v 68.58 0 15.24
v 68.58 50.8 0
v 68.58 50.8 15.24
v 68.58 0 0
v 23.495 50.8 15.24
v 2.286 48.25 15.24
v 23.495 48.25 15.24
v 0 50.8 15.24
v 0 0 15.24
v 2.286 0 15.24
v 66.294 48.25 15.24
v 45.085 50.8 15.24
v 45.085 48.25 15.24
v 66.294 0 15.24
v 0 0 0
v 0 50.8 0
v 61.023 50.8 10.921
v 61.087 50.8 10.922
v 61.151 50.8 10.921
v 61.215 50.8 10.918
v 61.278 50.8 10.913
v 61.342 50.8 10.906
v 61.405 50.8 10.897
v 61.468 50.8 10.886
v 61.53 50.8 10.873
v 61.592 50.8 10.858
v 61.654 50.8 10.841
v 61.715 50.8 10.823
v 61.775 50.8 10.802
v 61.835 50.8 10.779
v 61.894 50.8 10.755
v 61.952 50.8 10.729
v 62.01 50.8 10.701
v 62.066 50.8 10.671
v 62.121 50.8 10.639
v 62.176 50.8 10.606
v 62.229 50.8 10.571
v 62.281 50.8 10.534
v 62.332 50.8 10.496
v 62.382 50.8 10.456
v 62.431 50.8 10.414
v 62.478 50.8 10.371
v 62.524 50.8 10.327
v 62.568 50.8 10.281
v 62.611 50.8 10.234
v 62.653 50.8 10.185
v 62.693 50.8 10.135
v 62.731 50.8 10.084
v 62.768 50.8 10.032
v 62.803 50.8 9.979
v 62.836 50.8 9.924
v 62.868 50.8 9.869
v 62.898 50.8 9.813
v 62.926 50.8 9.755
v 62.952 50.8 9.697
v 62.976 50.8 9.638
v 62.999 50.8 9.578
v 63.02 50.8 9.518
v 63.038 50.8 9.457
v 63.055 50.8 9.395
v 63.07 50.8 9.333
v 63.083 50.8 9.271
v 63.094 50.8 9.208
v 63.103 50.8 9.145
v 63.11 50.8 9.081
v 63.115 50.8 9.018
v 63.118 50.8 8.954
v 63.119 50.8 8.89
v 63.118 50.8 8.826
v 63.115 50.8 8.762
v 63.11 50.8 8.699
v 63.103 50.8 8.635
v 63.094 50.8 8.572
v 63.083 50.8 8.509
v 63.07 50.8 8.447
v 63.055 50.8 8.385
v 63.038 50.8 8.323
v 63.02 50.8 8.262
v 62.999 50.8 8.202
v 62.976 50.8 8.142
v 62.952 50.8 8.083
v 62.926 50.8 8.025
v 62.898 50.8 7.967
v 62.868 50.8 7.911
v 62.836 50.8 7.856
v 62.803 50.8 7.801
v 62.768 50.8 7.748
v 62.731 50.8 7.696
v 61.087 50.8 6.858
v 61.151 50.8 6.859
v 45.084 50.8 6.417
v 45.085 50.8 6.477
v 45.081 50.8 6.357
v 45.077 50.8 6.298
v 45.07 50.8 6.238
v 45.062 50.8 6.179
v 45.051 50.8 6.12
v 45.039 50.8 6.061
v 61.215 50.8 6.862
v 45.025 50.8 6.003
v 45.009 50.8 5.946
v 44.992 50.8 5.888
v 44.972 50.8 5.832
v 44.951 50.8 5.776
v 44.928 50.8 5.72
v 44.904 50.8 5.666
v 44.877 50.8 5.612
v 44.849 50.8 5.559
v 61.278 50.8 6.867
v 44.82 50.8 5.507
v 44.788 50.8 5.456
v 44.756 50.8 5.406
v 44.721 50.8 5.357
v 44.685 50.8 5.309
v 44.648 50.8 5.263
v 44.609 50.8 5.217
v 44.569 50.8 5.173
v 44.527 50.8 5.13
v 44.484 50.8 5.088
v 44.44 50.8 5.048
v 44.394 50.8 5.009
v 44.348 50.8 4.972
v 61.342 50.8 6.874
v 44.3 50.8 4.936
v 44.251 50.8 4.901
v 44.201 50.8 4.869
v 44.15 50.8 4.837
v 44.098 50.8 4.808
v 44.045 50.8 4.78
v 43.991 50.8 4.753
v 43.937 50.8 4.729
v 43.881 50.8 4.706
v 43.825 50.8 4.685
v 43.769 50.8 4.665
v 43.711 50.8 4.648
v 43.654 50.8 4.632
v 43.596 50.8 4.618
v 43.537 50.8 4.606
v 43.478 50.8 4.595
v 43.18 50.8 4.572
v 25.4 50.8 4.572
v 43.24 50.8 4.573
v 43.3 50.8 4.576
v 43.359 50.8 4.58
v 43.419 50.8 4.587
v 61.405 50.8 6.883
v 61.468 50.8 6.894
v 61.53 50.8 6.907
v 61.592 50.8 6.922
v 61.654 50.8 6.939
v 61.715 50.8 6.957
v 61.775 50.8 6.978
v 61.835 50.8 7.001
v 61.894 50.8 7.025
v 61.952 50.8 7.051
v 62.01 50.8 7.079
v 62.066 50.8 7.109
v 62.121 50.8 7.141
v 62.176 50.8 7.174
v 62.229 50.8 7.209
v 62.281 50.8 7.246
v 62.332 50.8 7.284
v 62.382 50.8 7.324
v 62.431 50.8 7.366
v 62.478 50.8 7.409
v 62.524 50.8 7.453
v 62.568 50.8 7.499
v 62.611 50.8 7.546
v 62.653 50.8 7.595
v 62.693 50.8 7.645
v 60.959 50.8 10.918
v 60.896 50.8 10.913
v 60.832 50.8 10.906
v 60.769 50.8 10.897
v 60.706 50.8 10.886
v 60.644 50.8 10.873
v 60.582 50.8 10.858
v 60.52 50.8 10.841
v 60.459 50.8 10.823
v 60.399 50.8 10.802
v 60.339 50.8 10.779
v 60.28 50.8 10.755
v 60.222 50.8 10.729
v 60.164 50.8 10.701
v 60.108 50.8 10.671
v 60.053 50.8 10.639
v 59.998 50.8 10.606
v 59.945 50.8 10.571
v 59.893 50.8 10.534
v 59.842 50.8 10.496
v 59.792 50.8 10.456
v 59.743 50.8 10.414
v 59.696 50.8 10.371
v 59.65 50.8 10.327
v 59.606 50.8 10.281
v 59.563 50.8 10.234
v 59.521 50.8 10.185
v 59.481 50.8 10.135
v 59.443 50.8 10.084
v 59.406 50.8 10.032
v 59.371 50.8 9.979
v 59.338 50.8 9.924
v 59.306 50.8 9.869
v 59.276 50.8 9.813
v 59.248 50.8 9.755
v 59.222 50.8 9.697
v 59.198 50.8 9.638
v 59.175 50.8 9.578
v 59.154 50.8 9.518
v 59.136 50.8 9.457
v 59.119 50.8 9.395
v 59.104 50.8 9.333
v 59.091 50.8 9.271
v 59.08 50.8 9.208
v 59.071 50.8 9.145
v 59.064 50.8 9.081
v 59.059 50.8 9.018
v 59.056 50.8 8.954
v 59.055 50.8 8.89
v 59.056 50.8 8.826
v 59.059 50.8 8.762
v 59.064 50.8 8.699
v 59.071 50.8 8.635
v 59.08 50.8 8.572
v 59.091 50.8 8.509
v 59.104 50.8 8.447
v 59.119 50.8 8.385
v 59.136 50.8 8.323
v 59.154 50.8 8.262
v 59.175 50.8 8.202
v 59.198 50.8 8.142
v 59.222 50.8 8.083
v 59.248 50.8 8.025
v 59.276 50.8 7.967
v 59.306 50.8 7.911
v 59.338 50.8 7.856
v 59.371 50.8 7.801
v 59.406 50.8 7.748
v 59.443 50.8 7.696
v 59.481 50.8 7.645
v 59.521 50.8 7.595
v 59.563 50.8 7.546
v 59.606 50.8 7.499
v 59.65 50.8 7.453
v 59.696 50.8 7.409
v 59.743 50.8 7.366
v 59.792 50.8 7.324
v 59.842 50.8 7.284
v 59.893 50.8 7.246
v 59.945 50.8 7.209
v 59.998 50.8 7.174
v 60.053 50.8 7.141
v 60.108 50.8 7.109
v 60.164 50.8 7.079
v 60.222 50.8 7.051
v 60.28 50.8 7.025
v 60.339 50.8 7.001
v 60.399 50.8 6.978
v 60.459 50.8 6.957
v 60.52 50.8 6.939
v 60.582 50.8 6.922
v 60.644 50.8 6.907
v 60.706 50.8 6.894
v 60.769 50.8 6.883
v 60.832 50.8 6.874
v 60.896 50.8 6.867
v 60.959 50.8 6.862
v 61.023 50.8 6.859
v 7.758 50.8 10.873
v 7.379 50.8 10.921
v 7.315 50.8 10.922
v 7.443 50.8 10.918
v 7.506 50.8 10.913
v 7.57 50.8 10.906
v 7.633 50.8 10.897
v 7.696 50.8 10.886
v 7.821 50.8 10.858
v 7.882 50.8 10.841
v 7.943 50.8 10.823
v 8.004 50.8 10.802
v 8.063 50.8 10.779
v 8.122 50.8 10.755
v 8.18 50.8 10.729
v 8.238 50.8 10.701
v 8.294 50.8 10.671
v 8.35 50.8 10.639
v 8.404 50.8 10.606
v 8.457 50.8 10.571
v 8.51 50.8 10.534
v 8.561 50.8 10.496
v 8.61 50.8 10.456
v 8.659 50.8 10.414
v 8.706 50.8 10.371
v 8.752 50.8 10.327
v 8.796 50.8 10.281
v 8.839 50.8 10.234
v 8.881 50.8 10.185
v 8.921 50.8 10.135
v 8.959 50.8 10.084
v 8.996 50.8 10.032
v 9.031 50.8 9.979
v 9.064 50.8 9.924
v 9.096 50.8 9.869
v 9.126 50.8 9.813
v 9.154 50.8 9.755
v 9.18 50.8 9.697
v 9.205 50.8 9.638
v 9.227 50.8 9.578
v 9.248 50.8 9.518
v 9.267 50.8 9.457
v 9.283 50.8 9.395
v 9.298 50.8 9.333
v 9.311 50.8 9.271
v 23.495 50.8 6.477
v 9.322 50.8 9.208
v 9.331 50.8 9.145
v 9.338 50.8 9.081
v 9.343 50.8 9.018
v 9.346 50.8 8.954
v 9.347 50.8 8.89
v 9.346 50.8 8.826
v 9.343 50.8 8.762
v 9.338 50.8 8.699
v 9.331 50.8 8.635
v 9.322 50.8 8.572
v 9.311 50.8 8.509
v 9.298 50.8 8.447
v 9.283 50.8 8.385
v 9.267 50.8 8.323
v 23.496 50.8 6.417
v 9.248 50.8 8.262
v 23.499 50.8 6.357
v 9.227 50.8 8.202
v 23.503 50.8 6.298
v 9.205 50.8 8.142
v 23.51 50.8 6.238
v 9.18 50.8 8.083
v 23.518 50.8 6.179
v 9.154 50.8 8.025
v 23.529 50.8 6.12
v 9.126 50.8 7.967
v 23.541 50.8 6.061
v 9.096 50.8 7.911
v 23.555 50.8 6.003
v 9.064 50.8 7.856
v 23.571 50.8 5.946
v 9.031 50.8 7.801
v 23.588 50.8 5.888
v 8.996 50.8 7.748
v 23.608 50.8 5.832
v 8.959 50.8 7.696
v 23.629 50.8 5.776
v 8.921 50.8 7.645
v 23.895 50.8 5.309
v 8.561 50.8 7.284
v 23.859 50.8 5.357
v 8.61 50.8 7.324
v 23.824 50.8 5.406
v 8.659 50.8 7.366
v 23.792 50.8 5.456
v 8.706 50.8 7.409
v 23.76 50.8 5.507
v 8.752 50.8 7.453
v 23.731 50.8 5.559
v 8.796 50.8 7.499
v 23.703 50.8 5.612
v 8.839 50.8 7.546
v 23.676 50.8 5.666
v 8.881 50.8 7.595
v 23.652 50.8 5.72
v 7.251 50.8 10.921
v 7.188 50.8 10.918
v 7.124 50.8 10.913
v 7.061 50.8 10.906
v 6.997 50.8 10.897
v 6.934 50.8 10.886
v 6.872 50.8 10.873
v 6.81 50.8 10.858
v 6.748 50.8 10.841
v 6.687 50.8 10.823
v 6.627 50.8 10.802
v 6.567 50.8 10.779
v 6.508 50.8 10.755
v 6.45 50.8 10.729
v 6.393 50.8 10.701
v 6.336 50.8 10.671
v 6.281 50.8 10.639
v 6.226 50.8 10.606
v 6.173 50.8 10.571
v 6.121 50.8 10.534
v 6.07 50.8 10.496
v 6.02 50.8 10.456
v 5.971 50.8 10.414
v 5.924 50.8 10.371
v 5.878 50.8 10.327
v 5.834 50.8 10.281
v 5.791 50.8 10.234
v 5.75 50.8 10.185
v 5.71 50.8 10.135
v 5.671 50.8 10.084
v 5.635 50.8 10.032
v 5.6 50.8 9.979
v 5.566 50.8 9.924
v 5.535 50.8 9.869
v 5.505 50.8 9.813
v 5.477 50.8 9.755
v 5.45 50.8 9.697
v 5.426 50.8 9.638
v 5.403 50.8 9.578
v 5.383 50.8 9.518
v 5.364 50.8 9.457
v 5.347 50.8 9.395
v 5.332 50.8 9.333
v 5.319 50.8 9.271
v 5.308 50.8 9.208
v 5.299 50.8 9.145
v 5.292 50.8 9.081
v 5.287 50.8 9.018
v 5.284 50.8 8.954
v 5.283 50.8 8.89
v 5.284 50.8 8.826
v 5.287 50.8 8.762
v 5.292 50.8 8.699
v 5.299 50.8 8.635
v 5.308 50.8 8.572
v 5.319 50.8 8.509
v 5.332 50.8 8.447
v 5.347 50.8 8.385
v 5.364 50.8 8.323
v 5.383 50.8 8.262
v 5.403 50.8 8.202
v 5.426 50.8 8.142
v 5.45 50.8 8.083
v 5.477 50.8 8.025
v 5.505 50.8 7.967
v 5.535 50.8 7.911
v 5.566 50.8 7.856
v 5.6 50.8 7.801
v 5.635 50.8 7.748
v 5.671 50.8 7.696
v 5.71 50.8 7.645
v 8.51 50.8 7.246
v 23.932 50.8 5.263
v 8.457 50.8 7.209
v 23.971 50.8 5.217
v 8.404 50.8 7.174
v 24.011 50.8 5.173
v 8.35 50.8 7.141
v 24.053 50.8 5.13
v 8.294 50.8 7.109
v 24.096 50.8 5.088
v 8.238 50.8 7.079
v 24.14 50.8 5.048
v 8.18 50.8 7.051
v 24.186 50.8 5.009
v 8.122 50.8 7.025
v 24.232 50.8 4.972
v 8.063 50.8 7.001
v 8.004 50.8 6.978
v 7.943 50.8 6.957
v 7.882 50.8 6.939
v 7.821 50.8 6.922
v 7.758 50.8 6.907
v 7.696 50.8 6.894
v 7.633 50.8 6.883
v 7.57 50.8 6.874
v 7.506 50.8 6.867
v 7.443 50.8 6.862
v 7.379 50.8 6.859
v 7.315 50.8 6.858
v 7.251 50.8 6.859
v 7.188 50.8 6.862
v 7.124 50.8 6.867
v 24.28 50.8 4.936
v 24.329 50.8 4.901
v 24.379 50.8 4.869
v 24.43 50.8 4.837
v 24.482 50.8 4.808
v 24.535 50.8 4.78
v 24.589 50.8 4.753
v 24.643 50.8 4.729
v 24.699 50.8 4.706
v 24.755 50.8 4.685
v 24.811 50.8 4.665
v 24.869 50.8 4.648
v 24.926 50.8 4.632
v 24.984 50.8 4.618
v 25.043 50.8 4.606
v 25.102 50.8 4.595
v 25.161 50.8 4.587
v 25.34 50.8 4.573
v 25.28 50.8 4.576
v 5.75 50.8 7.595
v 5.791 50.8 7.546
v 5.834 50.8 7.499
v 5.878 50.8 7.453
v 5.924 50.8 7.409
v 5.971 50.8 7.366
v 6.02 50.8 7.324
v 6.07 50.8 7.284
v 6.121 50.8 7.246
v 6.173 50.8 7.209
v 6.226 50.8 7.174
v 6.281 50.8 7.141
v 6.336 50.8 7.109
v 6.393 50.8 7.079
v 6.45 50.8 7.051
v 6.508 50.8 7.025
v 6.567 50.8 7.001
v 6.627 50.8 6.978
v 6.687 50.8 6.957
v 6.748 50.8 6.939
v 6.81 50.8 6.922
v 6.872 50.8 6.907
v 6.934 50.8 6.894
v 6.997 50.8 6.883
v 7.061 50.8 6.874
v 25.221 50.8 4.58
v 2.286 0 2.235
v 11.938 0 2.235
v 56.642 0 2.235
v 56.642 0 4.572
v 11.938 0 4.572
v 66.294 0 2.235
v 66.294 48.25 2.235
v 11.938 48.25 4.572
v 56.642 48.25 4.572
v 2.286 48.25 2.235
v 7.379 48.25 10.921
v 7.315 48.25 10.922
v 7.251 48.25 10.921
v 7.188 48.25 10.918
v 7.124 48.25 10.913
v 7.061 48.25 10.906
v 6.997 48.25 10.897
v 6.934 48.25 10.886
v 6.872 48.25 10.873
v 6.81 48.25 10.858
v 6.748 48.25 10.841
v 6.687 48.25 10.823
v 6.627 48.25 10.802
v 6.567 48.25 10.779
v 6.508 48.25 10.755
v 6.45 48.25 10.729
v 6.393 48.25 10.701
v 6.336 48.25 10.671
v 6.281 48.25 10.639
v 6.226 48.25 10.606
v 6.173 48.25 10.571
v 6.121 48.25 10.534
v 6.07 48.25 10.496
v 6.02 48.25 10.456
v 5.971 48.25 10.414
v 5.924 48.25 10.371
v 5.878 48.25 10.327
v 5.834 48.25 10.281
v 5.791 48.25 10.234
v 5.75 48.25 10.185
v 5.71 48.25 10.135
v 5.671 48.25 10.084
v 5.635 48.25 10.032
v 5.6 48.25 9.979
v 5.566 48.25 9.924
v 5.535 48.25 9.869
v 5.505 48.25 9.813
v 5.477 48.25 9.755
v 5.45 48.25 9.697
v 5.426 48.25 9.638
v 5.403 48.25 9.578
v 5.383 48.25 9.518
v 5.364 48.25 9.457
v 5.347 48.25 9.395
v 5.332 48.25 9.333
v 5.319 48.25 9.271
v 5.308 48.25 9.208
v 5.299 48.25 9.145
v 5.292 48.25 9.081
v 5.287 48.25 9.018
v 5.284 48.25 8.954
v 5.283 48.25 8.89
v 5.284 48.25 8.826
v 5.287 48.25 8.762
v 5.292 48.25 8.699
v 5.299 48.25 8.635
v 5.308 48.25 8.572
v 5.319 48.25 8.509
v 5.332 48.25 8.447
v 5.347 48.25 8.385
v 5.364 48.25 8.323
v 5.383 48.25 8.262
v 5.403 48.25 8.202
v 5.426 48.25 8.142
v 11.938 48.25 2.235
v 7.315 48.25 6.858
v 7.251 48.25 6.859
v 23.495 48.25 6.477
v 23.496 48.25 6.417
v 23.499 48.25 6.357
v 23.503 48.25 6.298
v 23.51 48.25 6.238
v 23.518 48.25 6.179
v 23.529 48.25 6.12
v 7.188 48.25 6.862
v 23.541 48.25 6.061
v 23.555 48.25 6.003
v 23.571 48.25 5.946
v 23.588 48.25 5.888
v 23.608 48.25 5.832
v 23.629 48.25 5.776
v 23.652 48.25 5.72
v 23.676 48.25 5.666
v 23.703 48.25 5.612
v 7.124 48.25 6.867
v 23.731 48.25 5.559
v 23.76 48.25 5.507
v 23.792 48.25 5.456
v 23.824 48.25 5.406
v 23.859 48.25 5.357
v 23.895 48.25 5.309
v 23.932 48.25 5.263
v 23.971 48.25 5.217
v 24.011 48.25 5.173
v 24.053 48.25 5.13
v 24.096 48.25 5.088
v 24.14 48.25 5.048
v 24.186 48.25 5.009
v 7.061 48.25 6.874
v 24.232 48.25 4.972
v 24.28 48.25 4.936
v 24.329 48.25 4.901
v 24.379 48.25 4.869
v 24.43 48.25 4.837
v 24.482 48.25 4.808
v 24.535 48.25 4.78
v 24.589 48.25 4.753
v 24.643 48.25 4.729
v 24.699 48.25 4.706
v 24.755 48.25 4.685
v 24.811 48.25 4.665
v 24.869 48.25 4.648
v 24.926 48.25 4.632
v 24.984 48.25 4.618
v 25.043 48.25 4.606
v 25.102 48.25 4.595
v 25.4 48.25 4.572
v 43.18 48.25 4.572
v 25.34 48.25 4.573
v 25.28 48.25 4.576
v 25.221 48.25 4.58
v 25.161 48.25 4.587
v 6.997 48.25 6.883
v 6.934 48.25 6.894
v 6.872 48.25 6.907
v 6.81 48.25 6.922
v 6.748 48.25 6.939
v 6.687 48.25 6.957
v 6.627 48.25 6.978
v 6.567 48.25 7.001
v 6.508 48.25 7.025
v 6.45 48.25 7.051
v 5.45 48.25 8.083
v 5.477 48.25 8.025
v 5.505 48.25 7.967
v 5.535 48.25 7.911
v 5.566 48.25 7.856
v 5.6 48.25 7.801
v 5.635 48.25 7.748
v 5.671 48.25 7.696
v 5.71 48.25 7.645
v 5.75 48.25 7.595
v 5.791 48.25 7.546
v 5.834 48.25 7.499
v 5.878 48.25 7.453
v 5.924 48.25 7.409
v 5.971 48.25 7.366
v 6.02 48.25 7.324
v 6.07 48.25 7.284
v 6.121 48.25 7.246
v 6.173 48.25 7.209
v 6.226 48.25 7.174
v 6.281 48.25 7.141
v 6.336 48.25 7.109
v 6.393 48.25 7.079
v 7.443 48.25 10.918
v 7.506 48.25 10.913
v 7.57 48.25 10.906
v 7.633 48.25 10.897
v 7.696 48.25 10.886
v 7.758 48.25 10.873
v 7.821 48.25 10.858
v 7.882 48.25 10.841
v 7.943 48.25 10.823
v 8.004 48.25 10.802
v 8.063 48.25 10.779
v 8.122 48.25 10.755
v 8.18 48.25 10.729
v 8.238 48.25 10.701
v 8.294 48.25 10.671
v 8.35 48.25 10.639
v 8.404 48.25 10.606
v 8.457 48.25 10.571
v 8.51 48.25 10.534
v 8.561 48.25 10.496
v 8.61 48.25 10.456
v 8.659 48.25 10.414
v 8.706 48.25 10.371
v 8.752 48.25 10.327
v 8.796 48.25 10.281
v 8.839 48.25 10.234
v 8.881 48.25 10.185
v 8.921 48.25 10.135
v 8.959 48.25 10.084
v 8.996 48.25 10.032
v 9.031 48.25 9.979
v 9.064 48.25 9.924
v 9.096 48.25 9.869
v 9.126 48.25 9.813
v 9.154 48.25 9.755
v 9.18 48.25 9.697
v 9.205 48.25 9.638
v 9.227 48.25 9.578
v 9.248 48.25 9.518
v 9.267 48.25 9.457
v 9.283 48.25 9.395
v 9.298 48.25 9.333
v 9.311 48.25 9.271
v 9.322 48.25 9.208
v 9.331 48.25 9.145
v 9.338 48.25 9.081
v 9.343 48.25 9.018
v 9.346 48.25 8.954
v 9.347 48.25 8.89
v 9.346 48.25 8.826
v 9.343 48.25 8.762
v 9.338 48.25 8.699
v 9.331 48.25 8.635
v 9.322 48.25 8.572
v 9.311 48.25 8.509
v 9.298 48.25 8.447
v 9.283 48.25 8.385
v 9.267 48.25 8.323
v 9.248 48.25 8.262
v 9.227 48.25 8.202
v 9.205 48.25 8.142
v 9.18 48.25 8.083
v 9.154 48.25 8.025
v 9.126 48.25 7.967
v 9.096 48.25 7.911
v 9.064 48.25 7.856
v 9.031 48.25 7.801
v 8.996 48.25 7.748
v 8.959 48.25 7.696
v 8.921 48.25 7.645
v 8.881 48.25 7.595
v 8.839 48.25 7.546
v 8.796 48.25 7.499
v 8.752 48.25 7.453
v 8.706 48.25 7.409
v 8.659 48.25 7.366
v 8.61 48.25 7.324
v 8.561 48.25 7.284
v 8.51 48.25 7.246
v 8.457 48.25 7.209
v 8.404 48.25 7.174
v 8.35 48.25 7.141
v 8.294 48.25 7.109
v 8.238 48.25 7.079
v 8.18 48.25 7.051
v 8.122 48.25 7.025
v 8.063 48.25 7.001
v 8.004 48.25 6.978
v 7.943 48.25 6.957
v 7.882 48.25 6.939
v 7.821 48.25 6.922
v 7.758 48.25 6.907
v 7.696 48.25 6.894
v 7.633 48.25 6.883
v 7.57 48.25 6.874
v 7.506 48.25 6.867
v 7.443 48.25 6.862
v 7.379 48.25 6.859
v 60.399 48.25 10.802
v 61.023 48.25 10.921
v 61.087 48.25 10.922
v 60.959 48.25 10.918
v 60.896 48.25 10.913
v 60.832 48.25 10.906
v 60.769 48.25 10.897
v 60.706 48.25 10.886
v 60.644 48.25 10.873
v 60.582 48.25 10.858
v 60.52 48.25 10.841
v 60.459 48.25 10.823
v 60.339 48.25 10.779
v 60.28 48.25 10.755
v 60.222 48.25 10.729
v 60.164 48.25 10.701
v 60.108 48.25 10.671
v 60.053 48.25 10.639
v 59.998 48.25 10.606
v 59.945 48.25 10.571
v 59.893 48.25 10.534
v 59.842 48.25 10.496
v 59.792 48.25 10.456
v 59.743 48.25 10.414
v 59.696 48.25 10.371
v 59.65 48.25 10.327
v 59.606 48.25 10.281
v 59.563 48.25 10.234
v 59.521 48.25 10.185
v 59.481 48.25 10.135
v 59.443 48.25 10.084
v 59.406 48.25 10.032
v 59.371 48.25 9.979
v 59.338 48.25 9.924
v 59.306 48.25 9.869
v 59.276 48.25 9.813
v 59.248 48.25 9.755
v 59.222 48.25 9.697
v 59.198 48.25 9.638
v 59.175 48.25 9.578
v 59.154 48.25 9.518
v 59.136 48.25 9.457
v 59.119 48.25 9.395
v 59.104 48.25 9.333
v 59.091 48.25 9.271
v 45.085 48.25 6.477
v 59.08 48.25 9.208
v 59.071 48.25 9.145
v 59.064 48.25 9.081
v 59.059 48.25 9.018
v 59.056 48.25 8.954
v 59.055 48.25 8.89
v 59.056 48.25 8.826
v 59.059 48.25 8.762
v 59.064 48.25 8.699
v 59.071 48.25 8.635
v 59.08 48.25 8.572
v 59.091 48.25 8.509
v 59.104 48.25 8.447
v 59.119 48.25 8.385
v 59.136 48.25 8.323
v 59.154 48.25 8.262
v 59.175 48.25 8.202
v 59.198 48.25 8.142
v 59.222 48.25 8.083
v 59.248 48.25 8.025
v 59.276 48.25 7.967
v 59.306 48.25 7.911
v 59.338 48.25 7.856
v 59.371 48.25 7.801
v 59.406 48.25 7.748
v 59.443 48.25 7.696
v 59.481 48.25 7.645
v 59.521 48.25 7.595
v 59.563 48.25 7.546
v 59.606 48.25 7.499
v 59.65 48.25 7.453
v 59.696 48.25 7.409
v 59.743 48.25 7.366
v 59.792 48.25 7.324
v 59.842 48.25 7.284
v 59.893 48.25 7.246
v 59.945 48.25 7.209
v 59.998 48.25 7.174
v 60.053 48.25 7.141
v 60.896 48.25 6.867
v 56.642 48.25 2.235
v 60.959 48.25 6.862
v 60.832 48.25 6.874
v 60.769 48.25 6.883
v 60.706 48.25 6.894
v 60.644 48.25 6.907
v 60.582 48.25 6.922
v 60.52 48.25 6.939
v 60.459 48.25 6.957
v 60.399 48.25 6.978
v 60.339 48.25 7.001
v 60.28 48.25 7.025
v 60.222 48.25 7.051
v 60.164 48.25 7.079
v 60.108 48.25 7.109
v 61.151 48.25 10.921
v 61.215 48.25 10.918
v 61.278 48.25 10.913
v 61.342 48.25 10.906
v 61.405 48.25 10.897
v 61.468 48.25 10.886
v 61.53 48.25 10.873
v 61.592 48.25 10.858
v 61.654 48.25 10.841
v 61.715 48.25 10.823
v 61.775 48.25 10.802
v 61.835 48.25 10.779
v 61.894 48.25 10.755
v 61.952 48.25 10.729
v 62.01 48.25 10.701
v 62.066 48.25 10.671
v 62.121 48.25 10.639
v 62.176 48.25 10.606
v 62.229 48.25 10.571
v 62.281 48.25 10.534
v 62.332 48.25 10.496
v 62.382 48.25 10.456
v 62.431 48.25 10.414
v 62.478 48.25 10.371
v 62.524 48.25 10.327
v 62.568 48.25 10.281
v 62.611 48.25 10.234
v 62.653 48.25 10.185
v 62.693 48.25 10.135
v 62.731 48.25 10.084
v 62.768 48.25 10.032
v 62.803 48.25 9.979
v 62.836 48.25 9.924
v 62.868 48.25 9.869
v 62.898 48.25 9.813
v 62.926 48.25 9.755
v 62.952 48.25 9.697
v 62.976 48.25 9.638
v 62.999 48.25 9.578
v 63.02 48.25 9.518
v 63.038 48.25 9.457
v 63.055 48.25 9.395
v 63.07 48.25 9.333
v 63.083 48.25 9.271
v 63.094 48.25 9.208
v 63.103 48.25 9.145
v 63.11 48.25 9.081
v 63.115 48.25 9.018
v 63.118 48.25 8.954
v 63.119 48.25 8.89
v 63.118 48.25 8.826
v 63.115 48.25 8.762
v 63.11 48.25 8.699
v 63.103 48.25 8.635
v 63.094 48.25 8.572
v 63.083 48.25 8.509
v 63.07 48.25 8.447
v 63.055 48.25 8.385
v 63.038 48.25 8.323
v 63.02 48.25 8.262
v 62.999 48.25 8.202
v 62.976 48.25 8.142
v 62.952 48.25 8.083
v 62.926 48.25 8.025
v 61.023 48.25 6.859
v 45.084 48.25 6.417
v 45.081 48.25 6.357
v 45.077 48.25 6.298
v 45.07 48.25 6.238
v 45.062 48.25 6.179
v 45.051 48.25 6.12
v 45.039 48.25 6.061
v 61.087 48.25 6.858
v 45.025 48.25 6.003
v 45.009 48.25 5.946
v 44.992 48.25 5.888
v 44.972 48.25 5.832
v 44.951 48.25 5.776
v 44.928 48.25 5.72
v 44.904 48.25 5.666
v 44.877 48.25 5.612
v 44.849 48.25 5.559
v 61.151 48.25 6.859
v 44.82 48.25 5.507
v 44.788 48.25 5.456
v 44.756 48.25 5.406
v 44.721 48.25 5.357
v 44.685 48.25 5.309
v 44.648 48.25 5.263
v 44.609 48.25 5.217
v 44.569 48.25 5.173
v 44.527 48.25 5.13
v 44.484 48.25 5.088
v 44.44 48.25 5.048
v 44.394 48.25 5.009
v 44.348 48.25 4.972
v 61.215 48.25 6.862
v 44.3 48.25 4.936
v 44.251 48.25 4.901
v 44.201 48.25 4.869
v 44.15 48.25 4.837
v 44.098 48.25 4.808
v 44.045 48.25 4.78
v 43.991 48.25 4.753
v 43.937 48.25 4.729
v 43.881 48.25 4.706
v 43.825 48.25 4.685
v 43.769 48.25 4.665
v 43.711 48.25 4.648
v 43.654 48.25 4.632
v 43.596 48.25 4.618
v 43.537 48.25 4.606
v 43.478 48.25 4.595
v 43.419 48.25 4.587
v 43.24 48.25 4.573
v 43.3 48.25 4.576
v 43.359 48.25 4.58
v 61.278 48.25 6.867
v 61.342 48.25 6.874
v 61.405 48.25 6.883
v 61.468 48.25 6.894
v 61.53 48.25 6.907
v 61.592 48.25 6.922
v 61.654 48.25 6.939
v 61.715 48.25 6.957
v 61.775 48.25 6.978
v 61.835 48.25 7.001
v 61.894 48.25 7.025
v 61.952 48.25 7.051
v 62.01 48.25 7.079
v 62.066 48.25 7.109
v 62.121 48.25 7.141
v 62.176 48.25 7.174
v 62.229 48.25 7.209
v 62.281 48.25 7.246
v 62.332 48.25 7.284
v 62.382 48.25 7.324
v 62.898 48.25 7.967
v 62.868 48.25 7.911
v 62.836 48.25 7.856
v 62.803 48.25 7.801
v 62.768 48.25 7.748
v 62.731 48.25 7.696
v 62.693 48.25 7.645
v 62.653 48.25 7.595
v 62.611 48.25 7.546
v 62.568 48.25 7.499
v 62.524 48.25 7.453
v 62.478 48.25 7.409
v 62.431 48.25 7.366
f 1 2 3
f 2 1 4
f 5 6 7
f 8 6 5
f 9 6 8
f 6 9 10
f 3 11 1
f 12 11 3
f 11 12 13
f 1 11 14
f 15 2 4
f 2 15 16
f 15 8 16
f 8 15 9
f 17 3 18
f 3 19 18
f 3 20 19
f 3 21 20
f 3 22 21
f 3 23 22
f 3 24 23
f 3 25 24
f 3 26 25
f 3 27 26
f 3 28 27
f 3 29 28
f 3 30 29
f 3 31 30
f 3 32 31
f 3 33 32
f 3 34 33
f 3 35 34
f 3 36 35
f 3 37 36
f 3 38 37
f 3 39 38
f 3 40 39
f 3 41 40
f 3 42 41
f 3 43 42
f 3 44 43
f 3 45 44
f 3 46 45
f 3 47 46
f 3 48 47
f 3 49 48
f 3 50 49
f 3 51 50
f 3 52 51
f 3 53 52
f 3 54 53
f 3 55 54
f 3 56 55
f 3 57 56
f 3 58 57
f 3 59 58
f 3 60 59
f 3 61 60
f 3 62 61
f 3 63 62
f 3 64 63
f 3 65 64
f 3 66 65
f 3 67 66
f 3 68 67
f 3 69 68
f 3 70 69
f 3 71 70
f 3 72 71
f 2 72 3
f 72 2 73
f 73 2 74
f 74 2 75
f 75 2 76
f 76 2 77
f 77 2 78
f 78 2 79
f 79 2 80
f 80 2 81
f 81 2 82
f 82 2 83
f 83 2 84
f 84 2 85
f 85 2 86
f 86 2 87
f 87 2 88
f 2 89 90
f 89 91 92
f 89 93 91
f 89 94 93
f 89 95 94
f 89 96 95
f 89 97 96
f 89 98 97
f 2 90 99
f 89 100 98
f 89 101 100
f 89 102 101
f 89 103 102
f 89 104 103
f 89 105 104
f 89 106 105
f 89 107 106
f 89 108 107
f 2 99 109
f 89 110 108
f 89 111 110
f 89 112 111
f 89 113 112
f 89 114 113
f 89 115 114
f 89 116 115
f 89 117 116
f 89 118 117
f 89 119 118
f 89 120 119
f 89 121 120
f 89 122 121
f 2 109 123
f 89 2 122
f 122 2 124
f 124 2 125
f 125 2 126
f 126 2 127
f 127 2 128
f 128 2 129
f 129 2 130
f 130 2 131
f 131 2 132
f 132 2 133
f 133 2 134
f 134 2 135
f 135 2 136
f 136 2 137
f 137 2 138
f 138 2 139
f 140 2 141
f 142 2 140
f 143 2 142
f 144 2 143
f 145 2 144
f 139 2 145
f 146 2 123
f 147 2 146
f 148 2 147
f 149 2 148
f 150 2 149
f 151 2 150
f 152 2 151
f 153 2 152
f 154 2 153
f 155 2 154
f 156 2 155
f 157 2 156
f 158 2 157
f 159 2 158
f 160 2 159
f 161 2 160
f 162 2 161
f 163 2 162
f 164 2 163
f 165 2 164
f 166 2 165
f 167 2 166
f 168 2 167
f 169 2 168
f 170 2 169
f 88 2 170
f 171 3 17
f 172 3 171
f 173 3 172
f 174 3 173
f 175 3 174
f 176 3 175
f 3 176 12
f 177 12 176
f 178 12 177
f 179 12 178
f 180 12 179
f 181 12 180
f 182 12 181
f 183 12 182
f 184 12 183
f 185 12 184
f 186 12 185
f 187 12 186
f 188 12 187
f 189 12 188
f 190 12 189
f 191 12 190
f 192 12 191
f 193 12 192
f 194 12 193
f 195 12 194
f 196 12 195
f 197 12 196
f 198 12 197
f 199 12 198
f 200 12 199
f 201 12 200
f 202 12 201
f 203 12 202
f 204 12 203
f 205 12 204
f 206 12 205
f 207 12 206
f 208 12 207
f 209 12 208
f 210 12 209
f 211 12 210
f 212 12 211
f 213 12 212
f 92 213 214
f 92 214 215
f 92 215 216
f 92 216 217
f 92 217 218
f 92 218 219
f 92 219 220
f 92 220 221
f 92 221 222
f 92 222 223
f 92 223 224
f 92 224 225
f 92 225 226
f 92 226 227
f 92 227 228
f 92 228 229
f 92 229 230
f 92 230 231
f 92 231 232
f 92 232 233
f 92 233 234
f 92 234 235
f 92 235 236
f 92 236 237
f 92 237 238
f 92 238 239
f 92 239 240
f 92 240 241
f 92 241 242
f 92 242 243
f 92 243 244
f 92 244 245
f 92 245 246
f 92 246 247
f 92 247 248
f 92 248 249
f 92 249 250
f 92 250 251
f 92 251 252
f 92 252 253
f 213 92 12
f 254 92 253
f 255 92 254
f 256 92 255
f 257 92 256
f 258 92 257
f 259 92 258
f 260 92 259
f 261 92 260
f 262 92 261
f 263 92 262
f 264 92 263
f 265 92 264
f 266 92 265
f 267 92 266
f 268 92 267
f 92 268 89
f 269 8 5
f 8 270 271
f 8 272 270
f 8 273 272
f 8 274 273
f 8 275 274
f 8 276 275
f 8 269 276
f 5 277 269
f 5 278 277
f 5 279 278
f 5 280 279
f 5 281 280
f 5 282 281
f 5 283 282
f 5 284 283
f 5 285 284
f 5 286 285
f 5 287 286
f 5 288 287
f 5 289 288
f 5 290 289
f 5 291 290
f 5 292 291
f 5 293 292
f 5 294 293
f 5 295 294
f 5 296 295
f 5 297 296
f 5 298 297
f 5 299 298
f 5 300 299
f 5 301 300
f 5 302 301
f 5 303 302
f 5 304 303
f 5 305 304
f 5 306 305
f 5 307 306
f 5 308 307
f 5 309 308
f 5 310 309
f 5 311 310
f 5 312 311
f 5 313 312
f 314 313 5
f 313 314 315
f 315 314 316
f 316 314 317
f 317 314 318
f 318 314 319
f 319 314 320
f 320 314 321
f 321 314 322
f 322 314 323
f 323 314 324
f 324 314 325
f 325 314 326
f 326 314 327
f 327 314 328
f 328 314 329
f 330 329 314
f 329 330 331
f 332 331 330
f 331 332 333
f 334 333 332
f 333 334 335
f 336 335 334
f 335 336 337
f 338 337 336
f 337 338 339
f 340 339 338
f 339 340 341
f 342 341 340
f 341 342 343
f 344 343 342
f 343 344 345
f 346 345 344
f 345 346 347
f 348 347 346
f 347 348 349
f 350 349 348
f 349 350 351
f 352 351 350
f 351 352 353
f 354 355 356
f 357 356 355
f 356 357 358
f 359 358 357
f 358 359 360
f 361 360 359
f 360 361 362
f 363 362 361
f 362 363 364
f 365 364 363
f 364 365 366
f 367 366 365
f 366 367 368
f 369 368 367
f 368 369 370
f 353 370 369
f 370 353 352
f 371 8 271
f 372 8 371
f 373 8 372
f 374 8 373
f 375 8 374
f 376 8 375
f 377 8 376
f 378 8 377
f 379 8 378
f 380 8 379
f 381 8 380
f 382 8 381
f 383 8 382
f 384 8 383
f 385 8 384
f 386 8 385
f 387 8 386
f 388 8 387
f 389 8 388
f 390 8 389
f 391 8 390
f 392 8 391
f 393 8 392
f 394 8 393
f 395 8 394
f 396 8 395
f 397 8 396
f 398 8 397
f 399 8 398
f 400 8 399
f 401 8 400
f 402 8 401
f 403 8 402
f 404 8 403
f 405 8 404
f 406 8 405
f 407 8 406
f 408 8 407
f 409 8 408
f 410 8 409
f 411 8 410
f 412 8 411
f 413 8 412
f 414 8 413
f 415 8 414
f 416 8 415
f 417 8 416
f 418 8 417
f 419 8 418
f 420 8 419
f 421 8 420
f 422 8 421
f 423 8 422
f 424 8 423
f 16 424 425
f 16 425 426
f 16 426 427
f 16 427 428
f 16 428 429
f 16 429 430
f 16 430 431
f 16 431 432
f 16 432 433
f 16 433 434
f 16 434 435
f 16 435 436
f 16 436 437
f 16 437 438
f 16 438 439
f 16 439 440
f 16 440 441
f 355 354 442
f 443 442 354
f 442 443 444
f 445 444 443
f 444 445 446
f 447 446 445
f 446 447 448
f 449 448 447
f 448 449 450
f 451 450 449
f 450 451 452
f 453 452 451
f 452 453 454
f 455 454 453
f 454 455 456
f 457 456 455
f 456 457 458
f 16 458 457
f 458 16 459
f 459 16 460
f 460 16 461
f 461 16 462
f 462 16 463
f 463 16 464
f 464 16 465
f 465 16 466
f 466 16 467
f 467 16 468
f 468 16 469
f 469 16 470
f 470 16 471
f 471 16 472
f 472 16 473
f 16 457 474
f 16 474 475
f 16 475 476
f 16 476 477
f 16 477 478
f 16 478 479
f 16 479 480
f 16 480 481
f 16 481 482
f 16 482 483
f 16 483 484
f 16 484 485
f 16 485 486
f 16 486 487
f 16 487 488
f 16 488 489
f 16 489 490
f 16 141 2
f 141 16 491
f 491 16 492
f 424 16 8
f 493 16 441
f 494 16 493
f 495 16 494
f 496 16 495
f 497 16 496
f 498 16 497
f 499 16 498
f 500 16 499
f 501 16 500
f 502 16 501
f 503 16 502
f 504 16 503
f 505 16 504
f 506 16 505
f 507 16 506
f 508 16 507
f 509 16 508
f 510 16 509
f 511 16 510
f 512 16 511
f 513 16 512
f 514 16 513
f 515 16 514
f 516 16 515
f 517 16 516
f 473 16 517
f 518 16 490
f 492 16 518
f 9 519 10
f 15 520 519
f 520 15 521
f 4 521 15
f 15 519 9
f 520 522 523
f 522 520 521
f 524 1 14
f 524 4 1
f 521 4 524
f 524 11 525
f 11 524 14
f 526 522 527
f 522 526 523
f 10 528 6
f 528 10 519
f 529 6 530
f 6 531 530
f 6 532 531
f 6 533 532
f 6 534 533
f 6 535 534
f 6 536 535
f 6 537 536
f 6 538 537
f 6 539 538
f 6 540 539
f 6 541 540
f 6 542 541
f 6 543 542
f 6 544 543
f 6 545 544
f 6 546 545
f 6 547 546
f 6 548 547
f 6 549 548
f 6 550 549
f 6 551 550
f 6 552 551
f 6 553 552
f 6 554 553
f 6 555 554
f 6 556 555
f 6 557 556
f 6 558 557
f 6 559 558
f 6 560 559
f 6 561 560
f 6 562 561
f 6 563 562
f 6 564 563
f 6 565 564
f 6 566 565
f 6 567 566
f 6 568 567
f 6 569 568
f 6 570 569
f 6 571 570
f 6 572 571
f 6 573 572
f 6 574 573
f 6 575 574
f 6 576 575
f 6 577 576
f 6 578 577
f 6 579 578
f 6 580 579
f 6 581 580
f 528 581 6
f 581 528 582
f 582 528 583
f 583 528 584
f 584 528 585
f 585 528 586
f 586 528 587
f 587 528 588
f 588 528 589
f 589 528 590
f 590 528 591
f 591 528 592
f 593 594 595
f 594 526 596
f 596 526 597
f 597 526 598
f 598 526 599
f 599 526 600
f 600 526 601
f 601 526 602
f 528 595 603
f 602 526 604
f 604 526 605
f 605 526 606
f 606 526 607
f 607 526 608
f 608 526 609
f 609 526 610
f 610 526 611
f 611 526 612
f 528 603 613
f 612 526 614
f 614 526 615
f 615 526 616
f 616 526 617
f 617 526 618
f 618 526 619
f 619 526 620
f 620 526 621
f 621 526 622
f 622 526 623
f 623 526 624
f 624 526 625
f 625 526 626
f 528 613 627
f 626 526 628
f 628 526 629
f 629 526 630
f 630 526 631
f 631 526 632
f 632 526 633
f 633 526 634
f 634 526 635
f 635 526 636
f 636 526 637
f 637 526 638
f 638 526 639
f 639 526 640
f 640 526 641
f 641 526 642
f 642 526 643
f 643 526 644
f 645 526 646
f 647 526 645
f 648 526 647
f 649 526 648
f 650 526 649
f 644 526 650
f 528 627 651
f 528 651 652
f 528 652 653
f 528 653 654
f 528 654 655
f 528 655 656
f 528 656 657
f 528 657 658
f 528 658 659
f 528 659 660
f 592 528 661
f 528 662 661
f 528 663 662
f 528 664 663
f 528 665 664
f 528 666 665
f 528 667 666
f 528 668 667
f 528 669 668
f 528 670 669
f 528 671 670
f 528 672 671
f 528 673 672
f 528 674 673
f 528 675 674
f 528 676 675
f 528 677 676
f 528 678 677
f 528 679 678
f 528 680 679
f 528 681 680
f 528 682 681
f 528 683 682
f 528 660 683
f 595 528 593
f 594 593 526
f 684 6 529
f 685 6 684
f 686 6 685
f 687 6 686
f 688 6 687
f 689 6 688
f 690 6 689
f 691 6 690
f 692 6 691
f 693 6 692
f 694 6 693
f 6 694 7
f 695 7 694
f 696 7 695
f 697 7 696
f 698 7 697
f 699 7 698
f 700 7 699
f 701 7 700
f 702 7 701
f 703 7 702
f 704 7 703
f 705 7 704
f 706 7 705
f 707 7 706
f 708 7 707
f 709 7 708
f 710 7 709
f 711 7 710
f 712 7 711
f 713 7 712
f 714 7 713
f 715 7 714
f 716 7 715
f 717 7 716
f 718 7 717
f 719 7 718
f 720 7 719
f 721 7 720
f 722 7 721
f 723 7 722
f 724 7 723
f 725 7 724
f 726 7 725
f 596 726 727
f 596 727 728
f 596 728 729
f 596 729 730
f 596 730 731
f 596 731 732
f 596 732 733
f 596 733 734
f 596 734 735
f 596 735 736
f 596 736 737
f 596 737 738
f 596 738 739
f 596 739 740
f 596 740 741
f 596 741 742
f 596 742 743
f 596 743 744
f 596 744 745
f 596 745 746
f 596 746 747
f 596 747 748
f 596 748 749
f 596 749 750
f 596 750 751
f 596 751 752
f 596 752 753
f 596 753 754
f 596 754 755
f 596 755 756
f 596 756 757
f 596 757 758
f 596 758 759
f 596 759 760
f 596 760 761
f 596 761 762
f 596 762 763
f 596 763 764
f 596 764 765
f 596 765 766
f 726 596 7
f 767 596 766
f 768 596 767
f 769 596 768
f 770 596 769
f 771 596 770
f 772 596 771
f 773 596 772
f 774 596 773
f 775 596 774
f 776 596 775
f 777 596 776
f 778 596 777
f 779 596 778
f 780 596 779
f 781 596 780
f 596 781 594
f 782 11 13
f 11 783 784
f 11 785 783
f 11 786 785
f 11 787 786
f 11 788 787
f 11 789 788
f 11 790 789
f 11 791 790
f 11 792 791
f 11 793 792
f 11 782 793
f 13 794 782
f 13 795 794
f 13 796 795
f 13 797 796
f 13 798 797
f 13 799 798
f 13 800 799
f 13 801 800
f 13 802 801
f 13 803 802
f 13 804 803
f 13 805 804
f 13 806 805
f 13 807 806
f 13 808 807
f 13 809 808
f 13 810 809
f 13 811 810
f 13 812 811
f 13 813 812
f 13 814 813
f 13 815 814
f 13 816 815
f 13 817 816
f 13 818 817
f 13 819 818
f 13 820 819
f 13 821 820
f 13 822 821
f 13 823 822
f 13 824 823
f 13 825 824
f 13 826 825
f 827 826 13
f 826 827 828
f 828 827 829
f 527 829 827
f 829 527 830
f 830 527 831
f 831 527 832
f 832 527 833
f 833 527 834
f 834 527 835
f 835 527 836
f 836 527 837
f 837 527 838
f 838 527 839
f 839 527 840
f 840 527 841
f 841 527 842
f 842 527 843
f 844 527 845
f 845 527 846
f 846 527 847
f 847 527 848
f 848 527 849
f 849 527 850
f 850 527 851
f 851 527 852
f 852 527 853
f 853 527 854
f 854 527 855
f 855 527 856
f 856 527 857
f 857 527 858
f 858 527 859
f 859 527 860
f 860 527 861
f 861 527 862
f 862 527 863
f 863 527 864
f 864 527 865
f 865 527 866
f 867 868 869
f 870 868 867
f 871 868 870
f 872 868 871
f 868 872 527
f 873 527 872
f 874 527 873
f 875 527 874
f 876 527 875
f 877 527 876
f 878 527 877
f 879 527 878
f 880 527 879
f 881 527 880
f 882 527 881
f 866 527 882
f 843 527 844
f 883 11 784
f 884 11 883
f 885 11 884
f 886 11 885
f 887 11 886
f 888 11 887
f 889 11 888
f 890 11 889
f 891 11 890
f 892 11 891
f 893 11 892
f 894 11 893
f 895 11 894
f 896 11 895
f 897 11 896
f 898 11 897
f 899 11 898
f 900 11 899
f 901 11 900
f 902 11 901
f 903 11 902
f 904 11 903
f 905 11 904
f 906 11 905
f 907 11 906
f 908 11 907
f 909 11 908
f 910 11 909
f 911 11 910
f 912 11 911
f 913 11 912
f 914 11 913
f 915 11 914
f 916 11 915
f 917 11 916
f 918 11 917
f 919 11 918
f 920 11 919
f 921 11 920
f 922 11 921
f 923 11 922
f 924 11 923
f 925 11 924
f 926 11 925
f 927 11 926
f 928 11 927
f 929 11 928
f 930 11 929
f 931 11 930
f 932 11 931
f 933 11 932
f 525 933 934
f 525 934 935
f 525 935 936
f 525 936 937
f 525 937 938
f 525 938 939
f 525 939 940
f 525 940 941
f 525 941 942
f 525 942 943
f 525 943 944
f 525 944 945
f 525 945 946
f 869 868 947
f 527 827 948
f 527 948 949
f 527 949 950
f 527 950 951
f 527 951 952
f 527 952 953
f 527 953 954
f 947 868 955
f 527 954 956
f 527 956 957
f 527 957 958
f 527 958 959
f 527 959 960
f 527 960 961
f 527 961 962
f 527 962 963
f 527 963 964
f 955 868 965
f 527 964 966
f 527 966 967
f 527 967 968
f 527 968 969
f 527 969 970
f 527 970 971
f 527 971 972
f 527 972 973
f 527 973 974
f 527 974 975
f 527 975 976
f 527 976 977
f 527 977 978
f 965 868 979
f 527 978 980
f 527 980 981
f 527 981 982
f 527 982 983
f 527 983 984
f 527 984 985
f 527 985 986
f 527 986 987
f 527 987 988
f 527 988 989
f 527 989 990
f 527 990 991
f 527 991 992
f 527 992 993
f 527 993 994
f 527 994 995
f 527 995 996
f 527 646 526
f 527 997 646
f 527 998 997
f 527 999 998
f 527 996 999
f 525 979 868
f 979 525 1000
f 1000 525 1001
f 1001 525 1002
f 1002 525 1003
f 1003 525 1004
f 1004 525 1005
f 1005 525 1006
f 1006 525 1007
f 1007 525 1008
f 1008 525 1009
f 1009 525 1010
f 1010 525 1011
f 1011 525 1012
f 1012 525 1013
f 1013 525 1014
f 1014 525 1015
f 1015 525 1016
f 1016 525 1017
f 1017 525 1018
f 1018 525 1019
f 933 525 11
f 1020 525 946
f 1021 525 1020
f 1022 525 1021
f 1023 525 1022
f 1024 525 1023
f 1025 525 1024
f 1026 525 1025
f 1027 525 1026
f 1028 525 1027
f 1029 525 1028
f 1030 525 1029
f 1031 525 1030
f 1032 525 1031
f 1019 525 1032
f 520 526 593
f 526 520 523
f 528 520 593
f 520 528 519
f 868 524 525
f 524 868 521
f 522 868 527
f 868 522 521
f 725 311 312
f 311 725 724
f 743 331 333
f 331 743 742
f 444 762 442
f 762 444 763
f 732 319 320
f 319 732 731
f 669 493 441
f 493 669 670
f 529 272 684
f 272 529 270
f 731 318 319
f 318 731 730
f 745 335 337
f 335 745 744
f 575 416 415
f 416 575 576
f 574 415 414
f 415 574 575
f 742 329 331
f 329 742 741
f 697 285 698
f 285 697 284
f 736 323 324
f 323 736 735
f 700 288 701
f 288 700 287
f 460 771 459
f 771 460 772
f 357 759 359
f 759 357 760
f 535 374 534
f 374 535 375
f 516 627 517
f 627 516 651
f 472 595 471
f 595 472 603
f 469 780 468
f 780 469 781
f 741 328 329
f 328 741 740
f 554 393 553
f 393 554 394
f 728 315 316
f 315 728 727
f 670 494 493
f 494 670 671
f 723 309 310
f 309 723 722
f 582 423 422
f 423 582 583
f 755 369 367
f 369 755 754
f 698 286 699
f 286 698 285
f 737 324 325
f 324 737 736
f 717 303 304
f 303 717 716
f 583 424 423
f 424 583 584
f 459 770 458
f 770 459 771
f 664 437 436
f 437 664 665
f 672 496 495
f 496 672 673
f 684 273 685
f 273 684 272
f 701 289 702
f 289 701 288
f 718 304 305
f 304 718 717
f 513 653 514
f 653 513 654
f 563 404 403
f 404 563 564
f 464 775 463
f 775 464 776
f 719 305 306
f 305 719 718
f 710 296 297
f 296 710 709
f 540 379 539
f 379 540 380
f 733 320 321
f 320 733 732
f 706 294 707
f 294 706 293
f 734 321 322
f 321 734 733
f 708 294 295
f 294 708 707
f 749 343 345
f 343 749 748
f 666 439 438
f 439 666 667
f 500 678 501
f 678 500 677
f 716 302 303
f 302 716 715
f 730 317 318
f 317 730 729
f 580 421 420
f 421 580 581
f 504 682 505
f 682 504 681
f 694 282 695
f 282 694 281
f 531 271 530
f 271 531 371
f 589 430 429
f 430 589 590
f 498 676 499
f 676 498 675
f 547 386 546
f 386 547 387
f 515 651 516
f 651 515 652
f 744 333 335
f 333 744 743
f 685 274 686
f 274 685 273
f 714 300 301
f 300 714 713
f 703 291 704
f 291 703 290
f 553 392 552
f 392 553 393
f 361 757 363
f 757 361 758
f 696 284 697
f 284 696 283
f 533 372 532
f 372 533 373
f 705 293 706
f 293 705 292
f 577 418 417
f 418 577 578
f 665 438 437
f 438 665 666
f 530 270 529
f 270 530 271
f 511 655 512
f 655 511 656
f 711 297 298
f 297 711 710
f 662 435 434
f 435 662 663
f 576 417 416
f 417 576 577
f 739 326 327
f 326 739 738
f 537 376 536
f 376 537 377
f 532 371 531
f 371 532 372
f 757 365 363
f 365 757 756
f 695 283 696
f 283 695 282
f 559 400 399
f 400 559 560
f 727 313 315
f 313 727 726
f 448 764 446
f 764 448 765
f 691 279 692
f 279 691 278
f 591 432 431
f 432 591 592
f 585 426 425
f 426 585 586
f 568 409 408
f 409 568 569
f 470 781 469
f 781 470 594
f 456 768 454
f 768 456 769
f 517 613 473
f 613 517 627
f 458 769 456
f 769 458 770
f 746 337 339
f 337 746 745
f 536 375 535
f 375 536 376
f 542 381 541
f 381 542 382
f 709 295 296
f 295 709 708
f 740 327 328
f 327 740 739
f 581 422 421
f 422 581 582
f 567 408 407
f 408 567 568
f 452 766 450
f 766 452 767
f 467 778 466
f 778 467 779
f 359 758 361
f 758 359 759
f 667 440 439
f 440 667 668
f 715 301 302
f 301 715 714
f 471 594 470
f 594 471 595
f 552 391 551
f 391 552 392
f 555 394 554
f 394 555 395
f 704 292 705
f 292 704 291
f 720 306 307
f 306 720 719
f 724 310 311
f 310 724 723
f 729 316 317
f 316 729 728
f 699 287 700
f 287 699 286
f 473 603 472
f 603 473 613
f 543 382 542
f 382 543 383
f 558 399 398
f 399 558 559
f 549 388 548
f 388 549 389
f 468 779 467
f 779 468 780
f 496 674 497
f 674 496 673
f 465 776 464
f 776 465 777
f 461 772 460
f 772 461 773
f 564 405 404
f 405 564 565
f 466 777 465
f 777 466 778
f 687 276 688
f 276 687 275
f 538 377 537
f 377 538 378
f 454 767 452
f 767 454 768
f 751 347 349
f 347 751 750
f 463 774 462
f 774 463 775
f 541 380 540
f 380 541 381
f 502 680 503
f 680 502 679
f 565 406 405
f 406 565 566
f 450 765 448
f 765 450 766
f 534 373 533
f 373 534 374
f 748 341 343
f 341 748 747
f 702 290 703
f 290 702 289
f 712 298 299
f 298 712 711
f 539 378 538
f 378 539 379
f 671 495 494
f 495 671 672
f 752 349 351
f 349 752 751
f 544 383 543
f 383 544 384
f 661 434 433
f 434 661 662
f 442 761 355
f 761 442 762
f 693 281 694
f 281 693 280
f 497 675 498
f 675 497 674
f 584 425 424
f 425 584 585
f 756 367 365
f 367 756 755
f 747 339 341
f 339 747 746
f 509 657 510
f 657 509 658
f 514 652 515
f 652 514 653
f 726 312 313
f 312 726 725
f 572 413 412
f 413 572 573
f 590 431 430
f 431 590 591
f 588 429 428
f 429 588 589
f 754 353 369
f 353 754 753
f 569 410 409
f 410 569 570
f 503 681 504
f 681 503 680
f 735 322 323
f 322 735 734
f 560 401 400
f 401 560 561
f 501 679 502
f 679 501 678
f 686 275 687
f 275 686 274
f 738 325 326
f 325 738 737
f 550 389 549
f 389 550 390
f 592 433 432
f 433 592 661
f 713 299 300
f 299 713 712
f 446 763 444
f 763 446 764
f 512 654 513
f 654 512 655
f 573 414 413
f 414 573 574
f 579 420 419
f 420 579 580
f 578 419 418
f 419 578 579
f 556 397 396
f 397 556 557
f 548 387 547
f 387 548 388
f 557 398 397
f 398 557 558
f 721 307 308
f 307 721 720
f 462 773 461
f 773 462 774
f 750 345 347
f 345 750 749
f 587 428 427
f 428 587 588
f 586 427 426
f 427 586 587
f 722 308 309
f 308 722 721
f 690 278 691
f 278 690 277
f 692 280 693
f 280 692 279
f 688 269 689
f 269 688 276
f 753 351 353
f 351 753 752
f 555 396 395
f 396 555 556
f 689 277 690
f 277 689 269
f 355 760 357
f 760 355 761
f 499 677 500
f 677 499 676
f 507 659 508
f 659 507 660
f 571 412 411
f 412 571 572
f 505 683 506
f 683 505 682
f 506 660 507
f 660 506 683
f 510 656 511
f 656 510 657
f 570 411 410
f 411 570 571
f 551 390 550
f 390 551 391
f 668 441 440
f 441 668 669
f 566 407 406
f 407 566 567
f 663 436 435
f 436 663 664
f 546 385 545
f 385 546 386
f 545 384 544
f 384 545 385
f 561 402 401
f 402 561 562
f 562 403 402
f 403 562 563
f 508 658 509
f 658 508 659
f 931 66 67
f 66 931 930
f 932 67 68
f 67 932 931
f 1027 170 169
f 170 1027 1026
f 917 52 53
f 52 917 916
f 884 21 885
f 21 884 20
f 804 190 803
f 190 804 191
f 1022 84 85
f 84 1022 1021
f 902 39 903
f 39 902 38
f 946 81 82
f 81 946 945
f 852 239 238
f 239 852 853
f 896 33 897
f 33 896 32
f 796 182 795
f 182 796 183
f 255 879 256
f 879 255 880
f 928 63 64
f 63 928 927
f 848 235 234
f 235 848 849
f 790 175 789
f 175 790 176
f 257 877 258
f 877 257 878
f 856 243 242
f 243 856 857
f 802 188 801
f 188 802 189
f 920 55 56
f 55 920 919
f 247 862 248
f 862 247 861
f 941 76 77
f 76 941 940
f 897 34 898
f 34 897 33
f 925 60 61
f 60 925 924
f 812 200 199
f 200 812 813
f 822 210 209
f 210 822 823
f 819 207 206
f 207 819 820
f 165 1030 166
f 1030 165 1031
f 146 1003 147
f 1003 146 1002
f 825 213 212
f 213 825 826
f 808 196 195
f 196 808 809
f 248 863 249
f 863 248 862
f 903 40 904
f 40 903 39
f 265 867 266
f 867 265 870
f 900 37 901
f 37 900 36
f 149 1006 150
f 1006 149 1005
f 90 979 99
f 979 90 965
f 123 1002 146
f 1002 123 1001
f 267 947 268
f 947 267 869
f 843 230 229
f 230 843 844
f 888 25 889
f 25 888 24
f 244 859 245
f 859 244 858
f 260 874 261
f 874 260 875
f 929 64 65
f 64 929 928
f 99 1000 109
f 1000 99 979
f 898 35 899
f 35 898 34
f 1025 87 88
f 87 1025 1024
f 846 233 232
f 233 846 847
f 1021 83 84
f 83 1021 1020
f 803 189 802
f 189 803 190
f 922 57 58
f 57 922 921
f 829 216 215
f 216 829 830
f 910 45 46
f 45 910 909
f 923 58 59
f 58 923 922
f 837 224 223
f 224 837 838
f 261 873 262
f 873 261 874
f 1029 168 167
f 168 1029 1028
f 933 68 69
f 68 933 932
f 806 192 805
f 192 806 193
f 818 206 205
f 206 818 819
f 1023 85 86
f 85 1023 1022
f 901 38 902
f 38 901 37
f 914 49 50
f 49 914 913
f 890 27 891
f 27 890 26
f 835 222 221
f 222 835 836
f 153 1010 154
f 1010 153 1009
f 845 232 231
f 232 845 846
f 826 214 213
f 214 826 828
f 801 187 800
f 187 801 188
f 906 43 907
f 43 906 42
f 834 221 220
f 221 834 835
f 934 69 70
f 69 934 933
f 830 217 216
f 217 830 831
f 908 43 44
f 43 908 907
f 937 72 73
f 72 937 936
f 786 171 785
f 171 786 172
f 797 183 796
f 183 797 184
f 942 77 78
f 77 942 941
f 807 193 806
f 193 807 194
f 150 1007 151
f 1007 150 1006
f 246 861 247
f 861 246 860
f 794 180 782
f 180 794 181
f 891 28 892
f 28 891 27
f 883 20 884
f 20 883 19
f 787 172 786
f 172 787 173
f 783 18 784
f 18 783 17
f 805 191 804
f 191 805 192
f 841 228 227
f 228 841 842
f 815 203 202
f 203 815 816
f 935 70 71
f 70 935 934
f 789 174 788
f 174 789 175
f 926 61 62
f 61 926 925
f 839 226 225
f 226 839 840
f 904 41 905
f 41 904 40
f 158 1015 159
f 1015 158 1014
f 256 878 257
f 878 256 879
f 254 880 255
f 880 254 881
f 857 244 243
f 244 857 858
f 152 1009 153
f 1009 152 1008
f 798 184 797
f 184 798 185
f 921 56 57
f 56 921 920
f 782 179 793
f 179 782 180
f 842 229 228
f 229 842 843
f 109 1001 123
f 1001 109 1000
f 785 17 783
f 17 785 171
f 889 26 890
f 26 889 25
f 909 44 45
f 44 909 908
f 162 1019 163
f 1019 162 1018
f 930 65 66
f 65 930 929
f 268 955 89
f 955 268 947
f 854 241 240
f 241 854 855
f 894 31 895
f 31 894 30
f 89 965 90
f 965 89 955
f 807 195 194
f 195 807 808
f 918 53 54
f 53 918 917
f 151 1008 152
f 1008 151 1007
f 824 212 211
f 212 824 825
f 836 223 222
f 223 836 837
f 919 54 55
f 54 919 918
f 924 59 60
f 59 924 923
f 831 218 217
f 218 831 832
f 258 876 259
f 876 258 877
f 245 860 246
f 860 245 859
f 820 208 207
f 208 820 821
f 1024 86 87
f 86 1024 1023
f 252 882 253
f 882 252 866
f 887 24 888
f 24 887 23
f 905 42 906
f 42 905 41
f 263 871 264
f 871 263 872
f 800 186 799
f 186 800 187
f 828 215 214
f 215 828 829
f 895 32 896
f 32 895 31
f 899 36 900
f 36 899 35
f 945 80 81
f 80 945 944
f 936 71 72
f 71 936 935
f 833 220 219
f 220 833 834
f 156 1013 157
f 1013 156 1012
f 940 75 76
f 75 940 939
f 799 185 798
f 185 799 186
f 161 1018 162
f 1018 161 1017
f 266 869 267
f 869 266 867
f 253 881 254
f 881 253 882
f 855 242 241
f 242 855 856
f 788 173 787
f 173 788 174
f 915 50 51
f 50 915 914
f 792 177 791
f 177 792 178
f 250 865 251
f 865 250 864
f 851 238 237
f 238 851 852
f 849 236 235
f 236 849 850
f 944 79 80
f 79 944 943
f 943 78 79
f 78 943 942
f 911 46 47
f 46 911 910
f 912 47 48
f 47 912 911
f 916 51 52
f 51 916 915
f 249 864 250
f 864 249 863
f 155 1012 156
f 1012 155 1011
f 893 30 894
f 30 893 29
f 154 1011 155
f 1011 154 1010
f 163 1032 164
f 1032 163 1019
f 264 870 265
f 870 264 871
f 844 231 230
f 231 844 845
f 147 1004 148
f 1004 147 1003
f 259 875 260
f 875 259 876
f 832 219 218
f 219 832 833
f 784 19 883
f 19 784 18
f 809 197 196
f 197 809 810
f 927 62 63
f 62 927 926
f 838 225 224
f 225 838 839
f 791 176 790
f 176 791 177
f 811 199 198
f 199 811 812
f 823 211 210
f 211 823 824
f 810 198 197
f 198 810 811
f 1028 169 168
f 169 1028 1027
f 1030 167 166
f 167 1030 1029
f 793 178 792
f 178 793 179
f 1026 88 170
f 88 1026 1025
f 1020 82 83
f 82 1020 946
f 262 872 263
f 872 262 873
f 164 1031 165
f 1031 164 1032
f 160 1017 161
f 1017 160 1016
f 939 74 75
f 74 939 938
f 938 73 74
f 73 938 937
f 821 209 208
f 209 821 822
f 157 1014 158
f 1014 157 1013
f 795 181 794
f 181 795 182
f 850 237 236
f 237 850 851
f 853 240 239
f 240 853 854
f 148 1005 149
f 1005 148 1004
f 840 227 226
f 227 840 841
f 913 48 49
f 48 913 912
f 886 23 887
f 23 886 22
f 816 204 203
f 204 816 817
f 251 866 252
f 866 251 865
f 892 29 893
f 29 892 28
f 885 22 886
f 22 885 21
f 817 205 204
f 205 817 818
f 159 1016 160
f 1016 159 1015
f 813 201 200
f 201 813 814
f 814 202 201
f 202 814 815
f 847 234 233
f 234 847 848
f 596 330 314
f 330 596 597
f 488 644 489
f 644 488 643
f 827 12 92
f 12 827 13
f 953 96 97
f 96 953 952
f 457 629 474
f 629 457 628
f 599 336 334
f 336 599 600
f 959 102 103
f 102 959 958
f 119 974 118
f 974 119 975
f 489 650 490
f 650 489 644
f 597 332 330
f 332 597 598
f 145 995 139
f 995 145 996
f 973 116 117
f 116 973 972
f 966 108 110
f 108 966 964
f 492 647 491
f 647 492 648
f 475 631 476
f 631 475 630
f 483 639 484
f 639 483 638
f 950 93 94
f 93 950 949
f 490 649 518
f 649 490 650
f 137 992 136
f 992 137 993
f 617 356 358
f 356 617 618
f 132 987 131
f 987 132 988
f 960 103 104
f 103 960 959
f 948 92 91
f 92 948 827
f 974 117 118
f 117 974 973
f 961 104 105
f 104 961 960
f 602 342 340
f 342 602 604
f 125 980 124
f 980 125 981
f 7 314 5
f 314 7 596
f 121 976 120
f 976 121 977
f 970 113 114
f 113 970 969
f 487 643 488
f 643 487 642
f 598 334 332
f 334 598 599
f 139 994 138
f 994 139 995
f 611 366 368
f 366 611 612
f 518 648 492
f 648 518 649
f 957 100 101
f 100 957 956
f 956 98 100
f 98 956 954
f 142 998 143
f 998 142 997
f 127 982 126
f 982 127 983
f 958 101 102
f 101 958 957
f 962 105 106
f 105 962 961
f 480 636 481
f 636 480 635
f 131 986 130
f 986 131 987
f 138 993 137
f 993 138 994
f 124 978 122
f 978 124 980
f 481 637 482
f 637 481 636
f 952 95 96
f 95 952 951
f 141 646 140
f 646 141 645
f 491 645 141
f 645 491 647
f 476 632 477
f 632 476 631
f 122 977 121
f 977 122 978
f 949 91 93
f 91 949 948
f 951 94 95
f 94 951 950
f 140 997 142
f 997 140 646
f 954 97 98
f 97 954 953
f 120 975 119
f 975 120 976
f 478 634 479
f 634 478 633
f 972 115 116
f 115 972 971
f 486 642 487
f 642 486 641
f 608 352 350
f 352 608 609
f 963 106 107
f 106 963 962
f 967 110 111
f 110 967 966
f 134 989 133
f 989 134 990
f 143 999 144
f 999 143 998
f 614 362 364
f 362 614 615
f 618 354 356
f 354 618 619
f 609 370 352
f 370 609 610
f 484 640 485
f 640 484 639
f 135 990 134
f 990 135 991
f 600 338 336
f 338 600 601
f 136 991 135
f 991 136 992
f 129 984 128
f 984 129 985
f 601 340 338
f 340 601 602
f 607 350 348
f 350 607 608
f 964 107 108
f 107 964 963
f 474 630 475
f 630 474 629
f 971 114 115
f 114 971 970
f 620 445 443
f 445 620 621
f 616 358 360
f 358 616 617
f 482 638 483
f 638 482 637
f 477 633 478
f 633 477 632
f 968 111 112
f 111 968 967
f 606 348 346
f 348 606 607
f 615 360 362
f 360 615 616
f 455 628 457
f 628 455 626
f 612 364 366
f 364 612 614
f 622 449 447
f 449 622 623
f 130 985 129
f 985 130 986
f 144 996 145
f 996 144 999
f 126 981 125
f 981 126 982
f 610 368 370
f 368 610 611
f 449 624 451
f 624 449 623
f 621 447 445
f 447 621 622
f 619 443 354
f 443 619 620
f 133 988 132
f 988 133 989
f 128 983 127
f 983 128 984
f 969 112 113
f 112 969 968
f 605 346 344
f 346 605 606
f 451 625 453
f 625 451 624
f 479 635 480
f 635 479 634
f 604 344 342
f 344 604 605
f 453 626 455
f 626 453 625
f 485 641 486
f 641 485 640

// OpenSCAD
//
// Licensed under MIT license
//
// Copyright (c) 2025 Adam R. Maxwell
// posted to https://groups.io/g/TekScopes/message/210788
// 

function mm(inches) = inches * 25.4;

$fn=200;

module rounded_square( width, radius_corner ) {
	translate( [ radius_corner, radius_corner, 0 ] )
		minkowski() {
			square( width - 2 * radius_corner );
			circle( radius_corner );
		}
}

difference() {

    cube([mm(2.7), mm(2), mm(0.6)]);
    
    // slide over by wall thickness and up by bottom thickness
    translate([mm(2.7-2.52)/2, -0.01, mm(0.18)])
        cube([mm(2.52), mm(1.9), mm(1)]);

    // spring channel; over by wall thickness
    translate([mm(2.7-2.52)/2, -0.01, mm(0.088)])
        cube([mm(0.38), mm(1.9), mm(1)]);
    
    // spring channel; over full width - channel width - wall thickness
    translate([mm(2.7)-mm(0.38) - mm(2.7-2.52)/2, -0.01, mm(0.088)])
        cube([mm(0.38), mm(1.9), mm(1)]);

    translate([mm(0.288), mm(2.5), mm(0.35)]) {
        rotate([90, 0, 0])
            cylinder(h=mm(3), d=mm(0.16), center=false);
    }
    
    translate([mm(2.405), mm(2.5), mm(0.35)]) {
        rotate([90, 0, 0])
            cylinder(h=mm(3), d=mm(0.16), center=false);
    }

    // back cutout
    translate([mm(2.7-0.85)/2, mm(2.5), mm(0.18)])
        rotate([90, 0, 0])
            linear_extrude(mm(2))
                rounded_square(mm(0.85), mm(0.075));

}
